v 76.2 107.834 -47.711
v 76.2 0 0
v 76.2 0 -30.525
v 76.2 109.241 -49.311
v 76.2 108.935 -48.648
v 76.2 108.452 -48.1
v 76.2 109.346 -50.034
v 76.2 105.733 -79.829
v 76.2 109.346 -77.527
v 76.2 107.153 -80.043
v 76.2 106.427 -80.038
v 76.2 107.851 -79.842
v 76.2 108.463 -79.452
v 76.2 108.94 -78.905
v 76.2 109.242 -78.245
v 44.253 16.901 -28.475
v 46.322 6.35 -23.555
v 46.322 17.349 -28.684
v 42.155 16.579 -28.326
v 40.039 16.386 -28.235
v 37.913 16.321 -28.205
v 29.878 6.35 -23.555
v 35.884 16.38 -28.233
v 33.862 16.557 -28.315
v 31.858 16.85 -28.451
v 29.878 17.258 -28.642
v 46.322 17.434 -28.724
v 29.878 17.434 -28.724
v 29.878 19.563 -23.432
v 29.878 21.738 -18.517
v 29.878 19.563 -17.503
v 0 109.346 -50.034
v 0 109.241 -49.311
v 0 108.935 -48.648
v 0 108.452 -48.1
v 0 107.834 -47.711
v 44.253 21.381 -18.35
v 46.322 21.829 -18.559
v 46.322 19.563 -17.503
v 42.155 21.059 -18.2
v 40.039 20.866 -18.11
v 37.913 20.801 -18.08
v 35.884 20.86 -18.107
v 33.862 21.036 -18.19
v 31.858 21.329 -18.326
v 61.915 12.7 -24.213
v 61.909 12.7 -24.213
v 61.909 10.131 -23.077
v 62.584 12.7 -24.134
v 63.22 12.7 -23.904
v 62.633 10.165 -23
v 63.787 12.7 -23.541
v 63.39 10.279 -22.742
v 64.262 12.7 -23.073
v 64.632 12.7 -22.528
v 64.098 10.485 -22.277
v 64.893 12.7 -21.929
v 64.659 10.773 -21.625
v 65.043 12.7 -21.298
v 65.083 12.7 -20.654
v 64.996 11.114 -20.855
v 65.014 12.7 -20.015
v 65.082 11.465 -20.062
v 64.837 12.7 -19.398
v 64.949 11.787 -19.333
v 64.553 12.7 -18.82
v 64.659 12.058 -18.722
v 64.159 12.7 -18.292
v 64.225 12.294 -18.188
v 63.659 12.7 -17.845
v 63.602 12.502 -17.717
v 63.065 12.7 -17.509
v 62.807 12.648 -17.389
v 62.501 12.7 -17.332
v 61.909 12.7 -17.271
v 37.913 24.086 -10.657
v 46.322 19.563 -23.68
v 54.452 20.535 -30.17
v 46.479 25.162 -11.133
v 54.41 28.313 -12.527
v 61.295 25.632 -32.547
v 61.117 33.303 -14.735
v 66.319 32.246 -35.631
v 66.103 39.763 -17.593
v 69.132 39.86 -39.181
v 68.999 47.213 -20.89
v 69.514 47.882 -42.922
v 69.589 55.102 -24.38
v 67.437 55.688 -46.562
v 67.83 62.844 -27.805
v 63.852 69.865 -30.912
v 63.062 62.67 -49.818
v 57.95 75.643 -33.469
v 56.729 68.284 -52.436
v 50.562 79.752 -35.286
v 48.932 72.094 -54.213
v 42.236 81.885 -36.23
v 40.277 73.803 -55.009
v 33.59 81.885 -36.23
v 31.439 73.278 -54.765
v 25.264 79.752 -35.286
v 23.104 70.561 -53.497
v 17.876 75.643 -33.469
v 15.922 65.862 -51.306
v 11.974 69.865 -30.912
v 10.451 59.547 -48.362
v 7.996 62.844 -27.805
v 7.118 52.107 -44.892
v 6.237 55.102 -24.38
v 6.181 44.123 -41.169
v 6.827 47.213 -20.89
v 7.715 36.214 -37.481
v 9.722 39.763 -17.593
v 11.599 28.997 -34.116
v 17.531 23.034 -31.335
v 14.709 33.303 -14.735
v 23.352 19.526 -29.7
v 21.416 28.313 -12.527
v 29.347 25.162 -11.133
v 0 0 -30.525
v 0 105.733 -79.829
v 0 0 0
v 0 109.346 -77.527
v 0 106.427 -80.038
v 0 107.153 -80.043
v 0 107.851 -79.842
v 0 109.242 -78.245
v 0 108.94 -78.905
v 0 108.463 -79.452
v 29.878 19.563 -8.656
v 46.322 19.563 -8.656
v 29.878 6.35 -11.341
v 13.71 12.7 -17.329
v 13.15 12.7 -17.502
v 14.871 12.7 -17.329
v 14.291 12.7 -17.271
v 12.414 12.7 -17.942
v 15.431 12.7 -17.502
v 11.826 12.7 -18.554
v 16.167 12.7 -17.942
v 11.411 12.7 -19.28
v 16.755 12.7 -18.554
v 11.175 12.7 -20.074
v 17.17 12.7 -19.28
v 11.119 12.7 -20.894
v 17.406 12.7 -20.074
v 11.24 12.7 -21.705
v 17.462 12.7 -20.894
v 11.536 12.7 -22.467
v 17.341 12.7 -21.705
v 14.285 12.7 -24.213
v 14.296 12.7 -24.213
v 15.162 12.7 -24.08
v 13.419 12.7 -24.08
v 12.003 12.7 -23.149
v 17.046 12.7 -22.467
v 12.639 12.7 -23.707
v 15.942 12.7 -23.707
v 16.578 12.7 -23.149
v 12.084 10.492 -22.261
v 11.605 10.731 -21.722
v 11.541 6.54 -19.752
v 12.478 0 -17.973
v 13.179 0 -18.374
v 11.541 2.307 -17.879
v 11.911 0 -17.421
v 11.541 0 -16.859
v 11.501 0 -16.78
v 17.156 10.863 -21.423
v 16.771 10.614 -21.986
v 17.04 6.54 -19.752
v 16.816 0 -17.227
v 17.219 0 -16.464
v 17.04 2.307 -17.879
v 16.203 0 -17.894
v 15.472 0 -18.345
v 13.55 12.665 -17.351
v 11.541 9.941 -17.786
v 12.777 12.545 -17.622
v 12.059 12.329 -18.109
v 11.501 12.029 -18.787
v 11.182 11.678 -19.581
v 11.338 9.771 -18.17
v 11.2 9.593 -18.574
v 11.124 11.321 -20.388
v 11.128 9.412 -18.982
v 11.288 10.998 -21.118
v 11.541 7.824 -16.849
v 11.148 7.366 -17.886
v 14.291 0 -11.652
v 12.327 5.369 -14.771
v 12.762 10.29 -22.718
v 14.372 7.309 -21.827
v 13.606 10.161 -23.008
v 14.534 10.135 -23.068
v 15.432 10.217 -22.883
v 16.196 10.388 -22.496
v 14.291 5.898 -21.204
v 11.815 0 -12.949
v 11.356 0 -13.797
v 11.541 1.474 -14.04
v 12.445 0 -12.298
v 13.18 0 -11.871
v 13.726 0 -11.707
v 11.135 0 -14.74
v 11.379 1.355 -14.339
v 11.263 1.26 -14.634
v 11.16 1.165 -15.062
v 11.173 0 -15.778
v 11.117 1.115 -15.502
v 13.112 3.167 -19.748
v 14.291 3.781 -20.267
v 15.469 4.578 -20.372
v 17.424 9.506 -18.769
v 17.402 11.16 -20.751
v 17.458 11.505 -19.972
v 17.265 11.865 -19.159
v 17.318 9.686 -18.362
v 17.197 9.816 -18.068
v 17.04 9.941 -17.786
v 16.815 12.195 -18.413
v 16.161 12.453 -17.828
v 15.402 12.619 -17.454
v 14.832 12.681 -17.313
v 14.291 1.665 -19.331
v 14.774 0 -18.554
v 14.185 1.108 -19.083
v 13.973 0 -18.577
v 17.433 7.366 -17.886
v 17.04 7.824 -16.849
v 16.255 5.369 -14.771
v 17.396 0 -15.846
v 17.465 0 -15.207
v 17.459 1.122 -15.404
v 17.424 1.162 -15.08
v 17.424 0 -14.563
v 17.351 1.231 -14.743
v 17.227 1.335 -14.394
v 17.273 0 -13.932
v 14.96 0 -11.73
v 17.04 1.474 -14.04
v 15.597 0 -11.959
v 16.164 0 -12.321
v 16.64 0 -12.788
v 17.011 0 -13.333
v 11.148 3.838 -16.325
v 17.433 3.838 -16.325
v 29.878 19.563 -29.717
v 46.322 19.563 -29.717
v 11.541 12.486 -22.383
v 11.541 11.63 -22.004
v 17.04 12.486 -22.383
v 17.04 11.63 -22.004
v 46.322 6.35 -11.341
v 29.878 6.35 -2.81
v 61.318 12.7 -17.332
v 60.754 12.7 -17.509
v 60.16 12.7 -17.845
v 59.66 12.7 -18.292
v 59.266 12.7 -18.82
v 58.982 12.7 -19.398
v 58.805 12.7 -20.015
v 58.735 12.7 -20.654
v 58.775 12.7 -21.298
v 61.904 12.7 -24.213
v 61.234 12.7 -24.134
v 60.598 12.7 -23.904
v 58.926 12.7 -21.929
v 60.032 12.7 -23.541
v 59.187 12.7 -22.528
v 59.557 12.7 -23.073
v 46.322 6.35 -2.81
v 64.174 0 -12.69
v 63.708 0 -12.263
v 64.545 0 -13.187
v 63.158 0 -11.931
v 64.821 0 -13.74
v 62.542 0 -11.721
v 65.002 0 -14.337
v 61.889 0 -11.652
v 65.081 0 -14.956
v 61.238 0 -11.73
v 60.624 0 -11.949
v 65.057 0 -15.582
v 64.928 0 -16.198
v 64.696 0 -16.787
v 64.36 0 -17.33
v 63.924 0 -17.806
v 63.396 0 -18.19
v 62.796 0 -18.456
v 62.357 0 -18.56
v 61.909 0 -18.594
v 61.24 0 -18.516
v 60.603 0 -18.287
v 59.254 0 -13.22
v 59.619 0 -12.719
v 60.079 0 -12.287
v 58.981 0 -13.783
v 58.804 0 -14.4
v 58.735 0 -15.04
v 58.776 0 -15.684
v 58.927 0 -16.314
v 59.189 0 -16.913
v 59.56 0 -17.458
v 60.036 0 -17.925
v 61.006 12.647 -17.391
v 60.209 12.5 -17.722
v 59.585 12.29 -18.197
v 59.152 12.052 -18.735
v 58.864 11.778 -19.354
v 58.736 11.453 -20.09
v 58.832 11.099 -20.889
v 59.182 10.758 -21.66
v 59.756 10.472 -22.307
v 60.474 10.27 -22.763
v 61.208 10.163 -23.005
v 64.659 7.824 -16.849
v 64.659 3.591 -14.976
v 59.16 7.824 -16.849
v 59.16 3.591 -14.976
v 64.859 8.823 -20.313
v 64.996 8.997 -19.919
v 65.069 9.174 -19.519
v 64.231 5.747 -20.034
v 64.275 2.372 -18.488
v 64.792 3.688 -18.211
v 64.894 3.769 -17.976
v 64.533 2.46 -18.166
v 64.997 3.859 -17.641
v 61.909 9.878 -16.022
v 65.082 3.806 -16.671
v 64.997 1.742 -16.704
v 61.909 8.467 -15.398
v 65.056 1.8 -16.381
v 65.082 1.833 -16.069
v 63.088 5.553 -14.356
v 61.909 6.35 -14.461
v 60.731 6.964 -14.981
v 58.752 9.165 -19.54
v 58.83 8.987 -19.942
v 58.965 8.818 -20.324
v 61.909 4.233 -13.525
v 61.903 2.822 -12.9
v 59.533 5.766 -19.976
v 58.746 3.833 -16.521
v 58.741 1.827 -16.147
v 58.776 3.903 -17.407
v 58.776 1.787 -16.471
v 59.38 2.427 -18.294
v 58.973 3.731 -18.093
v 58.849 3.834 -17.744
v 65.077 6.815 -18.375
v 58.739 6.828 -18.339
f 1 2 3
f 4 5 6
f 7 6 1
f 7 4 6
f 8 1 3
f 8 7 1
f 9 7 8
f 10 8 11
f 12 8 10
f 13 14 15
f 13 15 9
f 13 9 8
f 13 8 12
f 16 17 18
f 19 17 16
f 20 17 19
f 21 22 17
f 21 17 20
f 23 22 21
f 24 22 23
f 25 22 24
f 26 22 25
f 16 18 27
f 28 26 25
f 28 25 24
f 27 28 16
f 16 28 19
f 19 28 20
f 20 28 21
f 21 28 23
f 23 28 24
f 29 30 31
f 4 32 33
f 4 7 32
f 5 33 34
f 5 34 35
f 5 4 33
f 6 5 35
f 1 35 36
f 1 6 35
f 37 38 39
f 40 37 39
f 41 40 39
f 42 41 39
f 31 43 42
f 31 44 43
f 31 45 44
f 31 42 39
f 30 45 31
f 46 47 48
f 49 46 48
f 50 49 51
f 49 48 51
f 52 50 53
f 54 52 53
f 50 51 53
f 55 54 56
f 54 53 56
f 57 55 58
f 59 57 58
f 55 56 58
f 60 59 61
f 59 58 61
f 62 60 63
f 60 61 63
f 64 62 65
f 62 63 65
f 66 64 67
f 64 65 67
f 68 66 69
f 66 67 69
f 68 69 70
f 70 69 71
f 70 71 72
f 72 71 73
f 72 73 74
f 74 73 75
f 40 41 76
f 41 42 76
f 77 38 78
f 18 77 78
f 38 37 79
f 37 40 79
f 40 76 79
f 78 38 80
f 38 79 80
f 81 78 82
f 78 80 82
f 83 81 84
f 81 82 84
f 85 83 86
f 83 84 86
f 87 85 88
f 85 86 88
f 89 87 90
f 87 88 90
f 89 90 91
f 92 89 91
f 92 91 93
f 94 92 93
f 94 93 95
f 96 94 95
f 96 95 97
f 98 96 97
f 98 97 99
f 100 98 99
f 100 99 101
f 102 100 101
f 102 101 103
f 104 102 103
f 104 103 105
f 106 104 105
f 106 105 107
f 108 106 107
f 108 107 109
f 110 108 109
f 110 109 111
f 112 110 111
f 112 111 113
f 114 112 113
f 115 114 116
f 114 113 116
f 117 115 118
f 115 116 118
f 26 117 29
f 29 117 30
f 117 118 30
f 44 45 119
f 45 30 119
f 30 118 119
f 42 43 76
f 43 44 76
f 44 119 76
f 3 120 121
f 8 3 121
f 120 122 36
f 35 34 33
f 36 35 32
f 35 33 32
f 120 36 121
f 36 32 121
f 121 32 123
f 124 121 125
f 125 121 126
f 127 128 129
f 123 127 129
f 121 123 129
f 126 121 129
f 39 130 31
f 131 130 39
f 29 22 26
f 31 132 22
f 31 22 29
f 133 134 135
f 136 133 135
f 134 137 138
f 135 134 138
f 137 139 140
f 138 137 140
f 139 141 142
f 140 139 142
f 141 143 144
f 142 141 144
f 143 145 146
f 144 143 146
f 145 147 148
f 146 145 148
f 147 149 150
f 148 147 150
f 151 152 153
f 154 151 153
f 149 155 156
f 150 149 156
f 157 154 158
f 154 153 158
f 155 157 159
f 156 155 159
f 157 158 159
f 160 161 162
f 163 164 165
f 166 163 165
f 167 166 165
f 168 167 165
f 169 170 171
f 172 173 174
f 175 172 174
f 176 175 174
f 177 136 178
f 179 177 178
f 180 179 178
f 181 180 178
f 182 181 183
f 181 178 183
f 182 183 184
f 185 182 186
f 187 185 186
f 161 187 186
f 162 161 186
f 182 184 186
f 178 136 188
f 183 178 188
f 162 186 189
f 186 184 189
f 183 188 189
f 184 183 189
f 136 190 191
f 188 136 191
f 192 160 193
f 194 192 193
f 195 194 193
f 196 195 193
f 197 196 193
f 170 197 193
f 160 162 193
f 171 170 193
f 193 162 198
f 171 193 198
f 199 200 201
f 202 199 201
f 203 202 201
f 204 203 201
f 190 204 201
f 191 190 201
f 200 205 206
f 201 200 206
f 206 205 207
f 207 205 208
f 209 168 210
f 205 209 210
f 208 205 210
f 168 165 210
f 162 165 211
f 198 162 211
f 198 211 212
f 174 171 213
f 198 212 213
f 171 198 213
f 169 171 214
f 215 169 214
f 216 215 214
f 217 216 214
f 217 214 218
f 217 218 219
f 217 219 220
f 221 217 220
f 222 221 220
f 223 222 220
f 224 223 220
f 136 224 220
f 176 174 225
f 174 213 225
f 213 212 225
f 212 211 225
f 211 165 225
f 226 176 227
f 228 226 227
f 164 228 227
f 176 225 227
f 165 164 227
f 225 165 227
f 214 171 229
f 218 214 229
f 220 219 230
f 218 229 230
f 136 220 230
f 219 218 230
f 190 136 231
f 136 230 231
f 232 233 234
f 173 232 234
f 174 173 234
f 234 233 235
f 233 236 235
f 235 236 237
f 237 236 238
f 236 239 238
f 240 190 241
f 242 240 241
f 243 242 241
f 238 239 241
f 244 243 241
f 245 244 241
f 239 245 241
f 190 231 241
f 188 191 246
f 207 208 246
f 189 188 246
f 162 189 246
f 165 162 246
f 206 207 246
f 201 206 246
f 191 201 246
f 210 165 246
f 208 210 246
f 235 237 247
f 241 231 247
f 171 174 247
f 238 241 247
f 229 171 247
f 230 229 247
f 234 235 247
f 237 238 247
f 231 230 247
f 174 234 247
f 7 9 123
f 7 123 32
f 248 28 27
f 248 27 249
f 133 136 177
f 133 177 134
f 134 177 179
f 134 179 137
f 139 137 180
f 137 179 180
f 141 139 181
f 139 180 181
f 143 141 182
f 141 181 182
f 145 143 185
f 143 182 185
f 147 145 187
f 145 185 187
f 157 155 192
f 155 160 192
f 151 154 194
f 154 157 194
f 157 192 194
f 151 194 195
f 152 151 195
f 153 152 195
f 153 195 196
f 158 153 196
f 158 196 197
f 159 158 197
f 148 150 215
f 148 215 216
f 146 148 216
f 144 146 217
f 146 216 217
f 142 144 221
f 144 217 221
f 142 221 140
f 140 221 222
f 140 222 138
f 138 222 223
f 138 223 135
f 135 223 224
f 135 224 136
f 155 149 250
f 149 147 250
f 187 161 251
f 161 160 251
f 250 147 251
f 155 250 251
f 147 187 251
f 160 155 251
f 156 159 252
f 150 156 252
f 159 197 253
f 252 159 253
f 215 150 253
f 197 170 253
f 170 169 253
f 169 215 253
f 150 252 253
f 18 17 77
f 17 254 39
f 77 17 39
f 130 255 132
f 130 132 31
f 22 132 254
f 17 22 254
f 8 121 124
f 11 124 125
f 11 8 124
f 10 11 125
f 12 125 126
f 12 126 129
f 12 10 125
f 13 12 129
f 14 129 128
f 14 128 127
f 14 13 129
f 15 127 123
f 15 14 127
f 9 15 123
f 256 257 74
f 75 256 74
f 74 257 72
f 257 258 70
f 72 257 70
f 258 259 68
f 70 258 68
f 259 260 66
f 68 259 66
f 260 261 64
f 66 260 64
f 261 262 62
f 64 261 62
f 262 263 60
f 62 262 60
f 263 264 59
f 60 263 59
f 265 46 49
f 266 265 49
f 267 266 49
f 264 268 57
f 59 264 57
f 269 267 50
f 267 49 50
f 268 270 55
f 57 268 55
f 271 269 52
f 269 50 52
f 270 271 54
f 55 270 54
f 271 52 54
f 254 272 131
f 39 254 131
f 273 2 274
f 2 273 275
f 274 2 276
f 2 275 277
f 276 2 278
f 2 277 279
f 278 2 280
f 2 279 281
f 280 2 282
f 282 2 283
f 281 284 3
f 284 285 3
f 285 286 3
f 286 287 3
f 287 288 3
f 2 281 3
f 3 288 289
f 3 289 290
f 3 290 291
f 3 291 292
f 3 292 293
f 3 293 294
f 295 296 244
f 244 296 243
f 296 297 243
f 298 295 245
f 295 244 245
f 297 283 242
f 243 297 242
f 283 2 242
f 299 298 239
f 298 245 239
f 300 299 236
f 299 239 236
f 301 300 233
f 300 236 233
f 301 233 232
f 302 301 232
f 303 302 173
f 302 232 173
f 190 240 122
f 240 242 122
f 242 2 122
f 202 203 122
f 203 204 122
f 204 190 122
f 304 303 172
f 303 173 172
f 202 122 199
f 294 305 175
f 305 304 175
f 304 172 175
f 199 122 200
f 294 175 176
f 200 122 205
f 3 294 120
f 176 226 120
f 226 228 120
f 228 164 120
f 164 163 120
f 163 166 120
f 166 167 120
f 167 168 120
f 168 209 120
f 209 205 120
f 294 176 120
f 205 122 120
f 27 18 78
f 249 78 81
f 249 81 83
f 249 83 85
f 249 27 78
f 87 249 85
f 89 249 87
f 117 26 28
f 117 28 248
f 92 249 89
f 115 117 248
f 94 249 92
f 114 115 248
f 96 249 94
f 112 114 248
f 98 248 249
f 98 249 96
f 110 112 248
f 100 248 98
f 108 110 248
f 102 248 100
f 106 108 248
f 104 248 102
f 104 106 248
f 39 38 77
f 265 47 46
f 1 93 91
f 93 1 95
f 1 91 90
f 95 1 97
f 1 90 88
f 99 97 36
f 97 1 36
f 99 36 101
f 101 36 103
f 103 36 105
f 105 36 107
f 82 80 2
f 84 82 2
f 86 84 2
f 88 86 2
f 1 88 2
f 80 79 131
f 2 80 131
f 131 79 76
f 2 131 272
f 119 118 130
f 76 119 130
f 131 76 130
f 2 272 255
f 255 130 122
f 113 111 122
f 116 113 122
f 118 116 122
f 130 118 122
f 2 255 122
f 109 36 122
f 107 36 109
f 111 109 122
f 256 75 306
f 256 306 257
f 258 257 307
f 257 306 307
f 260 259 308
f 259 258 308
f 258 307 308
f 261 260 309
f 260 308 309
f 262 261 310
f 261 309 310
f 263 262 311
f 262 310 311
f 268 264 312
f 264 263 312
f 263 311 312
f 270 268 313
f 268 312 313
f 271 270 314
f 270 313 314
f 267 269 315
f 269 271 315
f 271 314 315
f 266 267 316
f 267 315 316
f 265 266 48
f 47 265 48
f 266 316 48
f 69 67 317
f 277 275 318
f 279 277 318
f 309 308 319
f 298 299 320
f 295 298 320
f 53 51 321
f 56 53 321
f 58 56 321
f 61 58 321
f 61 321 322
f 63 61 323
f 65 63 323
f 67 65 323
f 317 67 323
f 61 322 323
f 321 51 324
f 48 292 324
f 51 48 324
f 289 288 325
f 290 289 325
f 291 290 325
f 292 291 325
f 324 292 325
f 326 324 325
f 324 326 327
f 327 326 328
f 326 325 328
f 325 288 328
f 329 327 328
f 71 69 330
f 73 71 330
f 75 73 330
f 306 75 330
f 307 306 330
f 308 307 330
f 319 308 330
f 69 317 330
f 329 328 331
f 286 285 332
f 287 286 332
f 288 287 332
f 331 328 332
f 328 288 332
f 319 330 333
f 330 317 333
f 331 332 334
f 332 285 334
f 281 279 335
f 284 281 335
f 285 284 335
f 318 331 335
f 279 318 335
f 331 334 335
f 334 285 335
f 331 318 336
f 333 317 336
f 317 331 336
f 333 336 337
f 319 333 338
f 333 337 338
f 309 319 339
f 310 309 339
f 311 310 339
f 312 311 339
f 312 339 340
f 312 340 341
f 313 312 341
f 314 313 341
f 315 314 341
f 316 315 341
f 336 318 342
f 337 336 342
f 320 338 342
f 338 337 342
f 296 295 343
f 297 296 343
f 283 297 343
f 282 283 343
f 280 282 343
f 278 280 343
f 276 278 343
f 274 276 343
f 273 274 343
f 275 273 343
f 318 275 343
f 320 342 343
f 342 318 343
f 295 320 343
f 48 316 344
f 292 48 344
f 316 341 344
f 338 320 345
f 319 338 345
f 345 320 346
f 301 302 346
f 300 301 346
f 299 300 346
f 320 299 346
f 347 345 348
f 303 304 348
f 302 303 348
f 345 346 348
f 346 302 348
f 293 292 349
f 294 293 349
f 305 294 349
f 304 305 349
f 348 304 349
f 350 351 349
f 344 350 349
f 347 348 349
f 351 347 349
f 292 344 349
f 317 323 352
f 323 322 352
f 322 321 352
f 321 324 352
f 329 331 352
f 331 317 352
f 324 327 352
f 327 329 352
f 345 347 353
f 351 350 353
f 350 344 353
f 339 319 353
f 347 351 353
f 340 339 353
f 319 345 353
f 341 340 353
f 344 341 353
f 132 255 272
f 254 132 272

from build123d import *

# Parameters (mm, degrees)
BOSS_EXTRUDE1_DEPTH      = 76.2
FILLET1_R                = 2.54
CUT_EXTRUDE1_REACH       = 157.479
SKETCH2_R                = 31.75
CUT_EXTRUDE6_START       = 4
CUT_EXTRUDE6_DEPTH       = 14.602057312
CUT_EXTRUDE6_START_2     = 18.602057312
CUT_EXTRUDE6_2_DEPTH     = 2.80902025
CUT_EXTRUDE6_START_3     = 12.7
CUT_EXTRUDE6_3_OUTLINE_W = 57
CUT_EXTRUDE6_3_OUTLINE_H = 10
CUT_EXTRUDE6_3_DEPTH     = 2.568810953
CUT_EXTRUDE7_REACH       = 157.479
SKETCH12_W               = 16.443444888
SKETCH12_H               = 13.2134825
CUT_EXTRUDE9_REACH       = 134.385
SKETCH13_W               = 16.443444888
SKETCH13_H               = 11.069902364


with BuildPart() as part:
    # Sketch1 → Boss-Extrude1 (new body)
    with BuildSketch(Plane(origin=(0, 0, 0), x_dir=(0, 0, -1), z_dir=(1, 0, 0))):
        Polygon((0, 0), (30.524795297, 0), (81.513688576, 109.346034506), (48.380392686, 109.346034506), align=None)
    extrude(amount=BOSS_EXTRUDE1_DEPTH)

    # Fillet1
    fillet1_edges = [part.edges().sort_by_distance(p)[0] for p in [
        (38.1, 109.346034506, -48.380392686),
        (38.1, 109.346034506, -81.513688576),
    ]]
    fillet(fillet1_edges, radius=FILLET1_R)

    # Cut-Extrude1: up to this plane
    cut_extrude1_end = Plane(origin=(76.2, 3.803564356, -22.368025214), z_dir=(0, 0.4226182617406973, 0.906307787036651))
    # Sketch2 → Cut-Extrude1 (cut, up to the surface)
    with BuildSketch(Plane(origin=(0, 0, 0), x_dir=(1, 0, 0), z_dir=(0, 0.4046165331441324, 0.9144864466499344)), mode=Mode.PRIVATE) as cut_extrude1_sk1:
        with Locations(Location((37.912855144, 58.087931451, 0), (0, 0, 270))):
            Circle(SKETCH2_R)
    cut_extrude1_tool1 = split(extrude(cut_extrude1_sk1.sketch, amount=-CUT_EXTRUDE1_REACH, mode=Mode.PRIVATE), bisect_by=cut_extrude1_end, keep=Keep.BOTH, mode=Mode.PRIVATE)
    add(cut_extrude1_tool1.solids().sort_by_distance((37.912855, 53.120626, -23.503337))[0], mode=Mode.SUBTRACT)

    # Cut-Extrude6: read off the stored shape, not the designer's step
    # Cut-Extrude6 outline → Cut-Extrude6 (cut)
    with BuildSketch(Plane(origin=(0, 0, 0), x_dir=(1, 0, 0), z_dir=(0, 0.9144864466499345, -0.4046165331441322)).offset(CUT_EXTRUDE6_START)):
        with BuildLine():
            add(Edge.make_bspline(
                [(14.29054348, 10.655346562), (8.791282166, 10.655346562), (11.540912823, 15.416915606), (14.29054348, 20.17848465), (17.040174137, 15.416915606), (19.789804794, 10.655346562), (14.29054348, 10.655346562)],
                knots=[0, 0, 0, 2.094395102, 2.094395102, 4.188790205, 4.188790205, 6.283185307, 6.283185307, 6.283185307], degree=2, weights=[1, 0.5, 1, 0.5, 1, 0.5, 1]))
        make_face()
        with BuildLine():
            add(Edge.make_bspline(
                [(61.90945652, 17.004105287), (67.408717834, 17.004105287), (64.659087177, 12.242536243), (61.90945652, 7.4809672), (59.159825863, 12.242536243), (56.410195206, 17.004105287), (61.90945652, 17.004105287)],
                knots=[0, 0, 0, 2.094395102, 2.094395102, 4.188790205, 4.188790205, 6.283185307, 6.283185307, 6.283185307], degree=2, weights=[1, 0.5, 1, 0.5, 1, 0.5, 1]))
        make_face()
    extrude(amount=CUT_EXTRUDE6_DEPTH, mode=Mode.SUBTRACT)

    # Cut-Extrude6 2 outline → Cut-Extrude6 2 (cut)
    with BuildSketch(Plane(origin=(0, 0, 0), x_dir=(1, 0, 0), z_dir=(0, 0.9144864466499345, -0.4046165331441322)).offset(CUT_EXTRUDE6_START_2)):
        with BuildLine():
            add(Edge.make_bspline(
                [(14.29054348, 10.655346562), (8.791282166, 10.655346562), (11.540912823, 15.416915606), (14.29054348, 20.17848465), (17.040174137, 15.416915606), (19.789804794, 10.655346562), (14.29054348, 10.655346562)],
                knots=[0, 0, 0, 2.094395102, 2.094395102, 4.188790205, 4.188790205, 6.283185307, 6.283185307, 6.283185307], degree=2, weights=[1, 0.5, 1, 0.5, 1, 0.5, 1]))
        make_face()
        with BuildLine():
            add(Edge.make_bspline(
                [(61.90945652, 17.004105287), (67.408717834, 17.004105287), (64.659087177, 12.242536243), (61.90945652, 7.4809672), (59.159825863, 12.242536243), (56.410195206, 17.004105287), (61.90945652, 17.004105287)],
                knots=[0, 0, 0, 2.094395102, 2.094395102, 4.188790205, 4.188790205, 6.283185307, 6.283185307, 6.283185307], degree=2, weights=[1, 0.5, 1, 0.5, 1, 0.5, 1]))
        make_face()
    extrude(amount=CUT_EXTRUDE6_2_DEPTH, mode=Mode.SUBTRACT)

    # Cut-Extrude6 3 outline → Cut-Extrude6 3 (add)
    with BuildSketch(Plane(origin=(0, 0, 0), x_dir=(1, 0, 0), z_dir=(0, 1, 0)).offset(CUT_EXTRUDE6_START_3)):
        with Locations((38.5, 21)):
            Rectangle(CUT_EXTRUDE6_3_OUTLINE_W, CUT_EXTRUDE6_3_OUTLINE_H)
    extrude(amount=CUT_EXTRUDE6_3_DEPTH)

    # Cut-Extrude7: up to this plane
    cut_extrude7_end = Plane(origin=(76.2, 3.803564356, -22.368025214), z_dir=(0, 0.4226182617406973, 0.906307787036651))
    # Sketch12 → Cut-Extrude7 (cut, up to the surface)
    with BuildSketch(Plane.XY, mode=Mode.PRIVATE) as cut_extrude7_sk1:
        with Locations((38.1, 12.95674125)):
            Rectangle(SKETCH12_W, SKETCH12_H)
    cut_extrude7_tool1 = split(extrude(cut_extrude7_sk1.sketch, amount=-CUT_EXTRUDE7_REACH, mode=Mode.PRIVATE), bisect_by=cut_extrude7_end, keep=Keep.BOTH, mode=Mode.PRIVATE)
    add(cut_extrude7_tool1.solids().sort_by_distance((38.1, 12.956741, 0))[0], mode=Mode.SUBTRACT)

    # Cut-Extrude9: up to this face of the body (flat: up to its plane)
    cut_extrude9_end = Plane(part.part.faces().sort_by_distance((38.1, 6.35, -13.182509538))[0])
    # Sketch13 → Cut-Extrude9 (cut, up to the picked face)
    with BuildSketch(Plane(origin=(0, 25.32223957, -11.807954233), x_dir=(-1, 0, 0), z_dir=(0, -0.9063077870366496, 0.4226182617407003)), mode=Mode.PRIVATE) as cut_extrude9_sk1:
        with Locations((-38.1, 13.129908493)):
            Rectangle(SKETCH13_W, SKETCH13_H)
    cut_extrude9_tool1 = split(extrude(cut_extrude9_sk1.sketch, amount=CUT_EXTRUDE9_REACH, mode=Mode.PRIVATE), bisect_by=cut_extrude9_end, keep=Keep.BOTH, mode=Mode.PRIVATE)
    add(cut_extrude9_tool1.solids().sort_by(Axis((38.1, 19.7733, -23.707693), (0, -0.9063077870366496, 0.4226182617407003)))[0], mode=Mode.SUBTRACT)


solid = part.part
